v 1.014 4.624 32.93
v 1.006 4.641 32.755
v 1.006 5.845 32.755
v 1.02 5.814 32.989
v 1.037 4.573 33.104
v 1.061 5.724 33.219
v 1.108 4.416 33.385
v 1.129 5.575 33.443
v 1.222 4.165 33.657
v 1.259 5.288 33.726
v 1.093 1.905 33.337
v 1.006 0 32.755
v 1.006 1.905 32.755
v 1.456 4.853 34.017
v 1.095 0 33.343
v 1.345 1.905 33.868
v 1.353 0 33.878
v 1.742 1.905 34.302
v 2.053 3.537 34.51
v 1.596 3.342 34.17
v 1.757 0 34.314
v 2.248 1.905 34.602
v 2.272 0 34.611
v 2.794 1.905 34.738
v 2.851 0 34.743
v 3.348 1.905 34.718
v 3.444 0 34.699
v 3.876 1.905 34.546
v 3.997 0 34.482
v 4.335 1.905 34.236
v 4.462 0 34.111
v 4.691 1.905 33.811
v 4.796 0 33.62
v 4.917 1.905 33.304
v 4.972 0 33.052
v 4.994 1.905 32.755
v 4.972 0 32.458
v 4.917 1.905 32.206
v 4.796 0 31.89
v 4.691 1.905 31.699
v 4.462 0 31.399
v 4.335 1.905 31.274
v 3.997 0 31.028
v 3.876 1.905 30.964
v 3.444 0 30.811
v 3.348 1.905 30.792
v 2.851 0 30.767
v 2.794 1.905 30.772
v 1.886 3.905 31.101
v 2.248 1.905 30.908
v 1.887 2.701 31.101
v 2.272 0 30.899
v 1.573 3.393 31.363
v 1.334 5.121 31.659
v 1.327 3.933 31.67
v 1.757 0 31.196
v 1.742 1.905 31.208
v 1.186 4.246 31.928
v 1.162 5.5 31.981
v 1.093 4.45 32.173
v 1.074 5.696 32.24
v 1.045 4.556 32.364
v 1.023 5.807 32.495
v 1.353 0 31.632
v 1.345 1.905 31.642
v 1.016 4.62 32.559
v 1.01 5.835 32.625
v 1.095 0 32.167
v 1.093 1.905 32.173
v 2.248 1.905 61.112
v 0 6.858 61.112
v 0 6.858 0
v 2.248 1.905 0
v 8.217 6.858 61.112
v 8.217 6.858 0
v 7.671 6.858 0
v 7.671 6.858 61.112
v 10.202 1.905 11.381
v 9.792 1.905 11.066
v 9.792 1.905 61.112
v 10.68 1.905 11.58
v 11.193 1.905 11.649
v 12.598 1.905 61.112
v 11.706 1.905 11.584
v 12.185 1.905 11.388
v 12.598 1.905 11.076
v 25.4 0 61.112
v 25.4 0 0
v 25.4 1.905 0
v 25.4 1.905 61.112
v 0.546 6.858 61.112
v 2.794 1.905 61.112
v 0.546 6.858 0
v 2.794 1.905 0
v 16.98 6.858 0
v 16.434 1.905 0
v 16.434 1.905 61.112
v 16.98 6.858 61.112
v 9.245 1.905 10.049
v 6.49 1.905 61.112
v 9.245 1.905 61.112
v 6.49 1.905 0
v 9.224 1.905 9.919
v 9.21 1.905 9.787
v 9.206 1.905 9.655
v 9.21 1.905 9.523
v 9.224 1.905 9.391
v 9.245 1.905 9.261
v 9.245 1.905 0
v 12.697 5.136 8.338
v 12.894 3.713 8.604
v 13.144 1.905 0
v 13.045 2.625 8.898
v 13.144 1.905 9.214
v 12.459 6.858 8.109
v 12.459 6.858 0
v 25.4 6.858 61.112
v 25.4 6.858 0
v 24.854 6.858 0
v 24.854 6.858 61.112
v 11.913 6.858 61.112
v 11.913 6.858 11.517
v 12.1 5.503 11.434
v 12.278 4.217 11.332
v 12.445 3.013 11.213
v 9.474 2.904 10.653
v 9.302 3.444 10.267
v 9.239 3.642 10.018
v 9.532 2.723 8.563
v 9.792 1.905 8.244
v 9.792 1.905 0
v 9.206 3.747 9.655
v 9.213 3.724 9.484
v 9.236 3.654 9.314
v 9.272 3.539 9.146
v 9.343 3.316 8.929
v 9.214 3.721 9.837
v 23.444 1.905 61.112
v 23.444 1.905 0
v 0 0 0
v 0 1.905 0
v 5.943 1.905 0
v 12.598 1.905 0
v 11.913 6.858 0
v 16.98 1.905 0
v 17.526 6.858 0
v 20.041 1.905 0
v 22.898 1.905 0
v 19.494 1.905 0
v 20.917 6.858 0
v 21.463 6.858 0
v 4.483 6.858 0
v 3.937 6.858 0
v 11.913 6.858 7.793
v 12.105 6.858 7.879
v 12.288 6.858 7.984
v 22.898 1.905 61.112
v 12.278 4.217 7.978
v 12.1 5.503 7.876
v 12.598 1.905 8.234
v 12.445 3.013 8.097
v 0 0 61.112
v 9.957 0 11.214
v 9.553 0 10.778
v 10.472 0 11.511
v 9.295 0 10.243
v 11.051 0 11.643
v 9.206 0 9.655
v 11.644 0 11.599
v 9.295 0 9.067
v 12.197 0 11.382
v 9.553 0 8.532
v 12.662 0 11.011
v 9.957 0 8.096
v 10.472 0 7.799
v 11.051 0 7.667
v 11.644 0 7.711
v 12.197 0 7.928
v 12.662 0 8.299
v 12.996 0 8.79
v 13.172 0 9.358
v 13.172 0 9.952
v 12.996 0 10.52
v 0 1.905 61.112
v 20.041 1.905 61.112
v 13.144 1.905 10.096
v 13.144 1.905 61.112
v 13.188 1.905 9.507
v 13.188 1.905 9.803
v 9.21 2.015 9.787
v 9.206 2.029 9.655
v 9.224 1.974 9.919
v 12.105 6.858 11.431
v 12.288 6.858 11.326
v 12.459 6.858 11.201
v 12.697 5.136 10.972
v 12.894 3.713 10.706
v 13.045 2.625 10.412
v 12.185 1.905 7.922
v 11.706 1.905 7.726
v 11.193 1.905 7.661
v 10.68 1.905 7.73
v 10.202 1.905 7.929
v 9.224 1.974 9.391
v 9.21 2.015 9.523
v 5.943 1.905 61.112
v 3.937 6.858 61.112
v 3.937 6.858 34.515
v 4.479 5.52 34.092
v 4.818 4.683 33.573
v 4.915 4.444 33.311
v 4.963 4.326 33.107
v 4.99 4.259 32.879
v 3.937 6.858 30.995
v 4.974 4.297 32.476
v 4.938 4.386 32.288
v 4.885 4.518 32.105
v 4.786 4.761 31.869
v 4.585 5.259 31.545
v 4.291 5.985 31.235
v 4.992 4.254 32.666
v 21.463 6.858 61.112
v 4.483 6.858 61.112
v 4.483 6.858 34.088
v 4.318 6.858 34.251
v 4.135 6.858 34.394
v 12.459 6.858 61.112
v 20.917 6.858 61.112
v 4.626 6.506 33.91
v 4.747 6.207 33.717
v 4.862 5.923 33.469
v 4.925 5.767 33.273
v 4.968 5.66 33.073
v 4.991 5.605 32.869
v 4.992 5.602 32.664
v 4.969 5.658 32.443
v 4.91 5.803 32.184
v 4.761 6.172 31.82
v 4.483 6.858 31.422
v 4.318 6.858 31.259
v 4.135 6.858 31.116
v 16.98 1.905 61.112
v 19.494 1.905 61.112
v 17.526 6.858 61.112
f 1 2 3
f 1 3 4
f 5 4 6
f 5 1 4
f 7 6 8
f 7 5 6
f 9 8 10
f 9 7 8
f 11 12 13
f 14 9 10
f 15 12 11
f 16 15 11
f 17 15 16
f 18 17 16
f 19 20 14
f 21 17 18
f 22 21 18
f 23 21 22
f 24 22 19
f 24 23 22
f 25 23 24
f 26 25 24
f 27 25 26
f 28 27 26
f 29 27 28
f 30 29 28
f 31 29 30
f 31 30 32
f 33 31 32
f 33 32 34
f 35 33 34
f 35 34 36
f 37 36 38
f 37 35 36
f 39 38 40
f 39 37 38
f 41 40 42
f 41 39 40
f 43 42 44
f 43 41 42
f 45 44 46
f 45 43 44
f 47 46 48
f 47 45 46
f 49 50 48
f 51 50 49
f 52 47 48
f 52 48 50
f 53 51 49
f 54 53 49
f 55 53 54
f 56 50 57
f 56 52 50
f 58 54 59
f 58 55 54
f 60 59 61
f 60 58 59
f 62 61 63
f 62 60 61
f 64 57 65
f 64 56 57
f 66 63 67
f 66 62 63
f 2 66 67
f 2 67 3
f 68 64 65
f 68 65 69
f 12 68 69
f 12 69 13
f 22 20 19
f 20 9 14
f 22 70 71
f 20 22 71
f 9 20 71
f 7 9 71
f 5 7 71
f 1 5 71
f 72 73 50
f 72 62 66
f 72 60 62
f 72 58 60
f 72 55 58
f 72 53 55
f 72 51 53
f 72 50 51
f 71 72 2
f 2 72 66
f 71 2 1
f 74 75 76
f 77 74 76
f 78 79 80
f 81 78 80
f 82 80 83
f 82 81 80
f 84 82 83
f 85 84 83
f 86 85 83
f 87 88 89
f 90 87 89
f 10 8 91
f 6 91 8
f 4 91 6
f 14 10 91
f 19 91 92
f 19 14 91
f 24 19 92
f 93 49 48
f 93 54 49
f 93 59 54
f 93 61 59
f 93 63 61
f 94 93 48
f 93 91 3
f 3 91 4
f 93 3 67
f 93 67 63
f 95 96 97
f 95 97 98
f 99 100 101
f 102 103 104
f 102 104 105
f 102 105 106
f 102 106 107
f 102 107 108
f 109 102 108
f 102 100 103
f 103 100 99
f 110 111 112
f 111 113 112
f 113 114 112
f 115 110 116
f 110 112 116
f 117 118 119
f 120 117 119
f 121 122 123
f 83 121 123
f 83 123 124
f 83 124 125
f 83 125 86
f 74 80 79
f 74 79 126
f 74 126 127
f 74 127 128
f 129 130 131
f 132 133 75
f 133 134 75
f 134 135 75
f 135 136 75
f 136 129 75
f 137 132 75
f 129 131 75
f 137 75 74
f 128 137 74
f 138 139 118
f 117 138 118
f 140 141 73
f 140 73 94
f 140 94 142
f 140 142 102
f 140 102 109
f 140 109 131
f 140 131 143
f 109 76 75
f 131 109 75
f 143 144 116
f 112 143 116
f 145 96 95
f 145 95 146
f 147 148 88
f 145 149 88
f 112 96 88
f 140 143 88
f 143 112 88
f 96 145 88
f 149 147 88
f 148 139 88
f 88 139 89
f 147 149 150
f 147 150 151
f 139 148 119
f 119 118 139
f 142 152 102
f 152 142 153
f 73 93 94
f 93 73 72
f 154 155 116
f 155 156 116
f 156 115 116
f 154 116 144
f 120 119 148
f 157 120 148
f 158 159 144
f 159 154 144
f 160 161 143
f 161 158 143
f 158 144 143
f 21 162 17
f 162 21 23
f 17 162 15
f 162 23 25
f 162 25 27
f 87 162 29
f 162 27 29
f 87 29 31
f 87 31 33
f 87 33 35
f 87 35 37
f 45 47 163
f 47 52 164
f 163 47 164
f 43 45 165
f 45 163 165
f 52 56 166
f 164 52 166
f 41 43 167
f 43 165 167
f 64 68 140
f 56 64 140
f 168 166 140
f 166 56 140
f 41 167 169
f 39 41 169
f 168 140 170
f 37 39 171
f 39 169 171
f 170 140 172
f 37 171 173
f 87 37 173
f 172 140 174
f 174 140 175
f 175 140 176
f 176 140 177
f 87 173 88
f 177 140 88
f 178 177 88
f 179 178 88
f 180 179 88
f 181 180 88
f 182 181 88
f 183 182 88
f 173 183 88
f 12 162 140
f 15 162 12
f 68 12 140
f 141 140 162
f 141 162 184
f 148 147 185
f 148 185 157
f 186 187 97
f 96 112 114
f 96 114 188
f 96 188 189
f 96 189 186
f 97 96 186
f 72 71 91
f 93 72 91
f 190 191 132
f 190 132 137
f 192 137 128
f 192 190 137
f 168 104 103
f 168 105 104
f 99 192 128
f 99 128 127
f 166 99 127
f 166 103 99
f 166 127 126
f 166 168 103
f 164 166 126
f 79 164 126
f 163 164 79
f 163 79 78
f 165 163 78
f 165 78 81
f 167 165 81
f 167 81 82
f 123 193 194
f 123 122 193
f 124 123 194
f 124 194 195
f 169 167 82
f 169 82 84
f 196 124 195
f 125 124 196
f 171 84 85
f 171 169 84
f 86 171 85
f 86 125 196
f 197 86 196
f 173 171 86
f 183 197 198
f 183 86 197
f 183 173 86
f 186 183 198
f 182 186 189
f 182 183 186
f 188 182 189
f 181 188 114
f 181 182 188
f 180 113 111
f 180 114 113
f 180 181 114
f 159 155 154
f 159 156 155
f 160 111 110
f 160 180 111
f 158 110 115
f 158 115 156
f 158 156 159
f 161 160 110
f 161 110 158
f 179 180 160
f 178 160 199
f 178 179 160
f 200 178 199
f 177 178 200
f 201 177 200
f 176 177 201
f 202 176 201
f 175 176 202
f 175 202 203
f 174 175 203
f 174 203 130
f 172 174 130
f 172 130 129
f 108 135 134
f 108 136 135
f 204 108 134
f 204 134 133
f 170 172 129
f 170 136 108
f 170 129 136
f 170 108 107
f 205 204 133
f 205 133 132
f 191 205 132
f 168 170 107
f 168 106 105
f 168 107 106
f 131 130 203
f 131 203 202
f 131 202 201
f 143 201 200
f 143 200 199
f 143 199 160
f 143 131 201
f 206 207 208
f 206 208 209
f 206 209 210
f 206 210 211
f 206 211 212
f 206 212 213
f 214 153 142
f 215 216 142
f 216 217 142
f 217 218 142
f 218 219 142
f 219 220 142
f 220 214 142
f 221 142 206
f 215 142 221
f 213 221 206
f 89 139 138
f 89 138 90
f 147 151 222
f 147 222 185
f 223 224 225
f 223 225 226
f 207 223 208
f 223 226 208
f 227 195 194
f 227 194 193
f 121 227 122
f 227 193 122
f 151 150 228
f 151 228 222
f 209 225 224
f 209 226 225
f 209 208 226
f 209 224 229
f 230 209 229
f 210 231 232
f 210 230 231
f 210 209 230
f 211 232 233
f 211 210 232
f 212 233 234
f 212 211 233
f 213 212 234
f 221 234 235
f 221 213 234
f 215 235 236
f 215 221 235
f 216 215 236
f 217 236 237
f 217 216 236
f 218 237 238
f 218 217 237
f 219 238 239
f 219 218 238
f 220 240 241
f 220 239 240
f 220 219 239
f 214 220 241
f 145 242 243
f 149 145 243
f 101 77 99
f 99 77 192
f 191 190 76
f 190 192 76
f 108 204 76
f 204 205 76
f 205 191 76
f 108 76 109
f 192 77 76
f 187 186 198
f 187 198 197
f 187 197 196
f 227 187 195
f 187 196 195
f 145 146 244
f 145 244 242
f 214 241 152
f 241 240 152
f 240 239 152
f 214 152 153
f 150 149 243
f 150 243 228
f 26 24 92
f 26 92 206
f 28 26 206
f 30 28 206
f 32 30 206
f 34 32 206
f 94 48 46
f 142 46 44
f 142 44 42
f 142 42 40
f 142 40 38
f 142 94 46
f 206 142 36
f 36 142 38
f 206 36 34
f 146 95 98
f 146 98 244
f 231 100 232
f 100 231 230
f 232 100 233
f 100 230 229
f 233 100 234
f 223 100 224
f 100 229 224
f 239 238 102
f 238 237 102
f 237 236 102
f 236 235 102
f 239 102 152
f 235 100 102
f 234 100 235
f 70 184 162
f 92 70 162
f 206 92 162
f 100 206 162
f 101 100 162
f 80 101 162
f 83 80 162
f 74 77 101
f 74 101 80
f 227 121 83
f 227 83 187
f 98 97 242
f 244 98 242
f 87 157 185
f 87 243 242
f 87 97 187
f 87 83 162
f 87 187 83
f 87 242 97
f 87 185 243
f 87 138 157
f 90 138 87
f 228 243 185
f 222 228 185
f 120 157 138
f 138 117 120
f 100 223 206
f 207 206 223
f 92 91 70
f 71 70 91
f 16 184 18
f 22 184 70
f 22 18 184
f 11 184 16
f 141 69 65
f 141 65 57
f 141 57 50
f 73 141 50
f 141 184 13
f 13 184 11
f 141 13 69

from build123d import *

# Parameters (mm, degrees)
SKETCH1_W               = 25.4
SKETCH1_H               = 1.905
BASE_DEPTH              = 61.1124
FINS_DEPTH              = 61.1124
CUT_EXTRUDE1_DEPTH      = 67.365786688
CUT_EXTRUDE1_DEPTH_BACK = 67.365786688
SKETCH3_R               = 1.9939


with BuildPart() as part:
    # Sketch1 → Base (new body)
    with BuildSketch(Plane.XY):
        with Locations((12.7, 0.9525)):
            Rectangle(SKETCH1_W, SKETCH1_H)
    extrude(amount=BASE_DEPTH)

    # Sketch2 → Fins (add)
    with BuildSketch(Plane(origin=(0, 0, 0), x_dir=(-1, 0, 0), z_dir=(0, 0, -1))):
        Polygon((-23.444268018, 1.905), (-25.4, 6.858), (-24.853831982, 6.858), (-22.8981, 1.905), align=None)
        Polygon((-20.040531982, 1.905), (-19.494363964, 1.905), (-20.916831982, 6.858), (-21.463, 6.858), align=None)
        Polygon((-16.979831982, 1.905), (-16.433663964, 1.905), (-16.979831982, 6.858), (-17.526, 6.858), align=None)
        Polygon((-2.794, 1.905), (-2.247831982, 1.905), (0, 6.858), (-0.546168018, 6.858), align=None)
        Polygon((-12.458768018, 6.858), (-11.9126, 6.858), (-12.598263964, 1.905), (-13.144431982, 1.905), align=None)
        Polygon((-8.216968018, 6.858), (-7.6708, 6.858), (-9.245463964, 1.905), (-9.791631982, 1.905), align=None)
        Polygon((-4.483168018, 6.858), (-3.937, 6.858), (-5.943463964, 1.905), (-6.489631982, 1.905), align=None)
    extrude(amount=-FINS_DEPTH)

    # Sketch3 → Cut-Extrude1 (cut, two sides: drawn at the far end of the back side and taken through both)
    with BuildSketch(Plane(origin=(0, 1.905, 0), x_dir=(1, 0, 0), z_dir=(0, 1, 0)).offset(-CUT_EXTRUDE1_DEPTH_BACK)):
        with Locations(Location((11.2, -9.655, 0), (0, 0, 180))):
            Circle(SKETCH3_R)
        with Locations(Location((3, -32.755, 0), (0, 0, 180))):
            Circle(SKETCH3_R)
    extrude(amount=CUT_EXTRUDE1_DEPTH + CUT_EXTRUDE1_DEPTH_BACK, mode=Mode.SUBTRACT)


solid = part.part
